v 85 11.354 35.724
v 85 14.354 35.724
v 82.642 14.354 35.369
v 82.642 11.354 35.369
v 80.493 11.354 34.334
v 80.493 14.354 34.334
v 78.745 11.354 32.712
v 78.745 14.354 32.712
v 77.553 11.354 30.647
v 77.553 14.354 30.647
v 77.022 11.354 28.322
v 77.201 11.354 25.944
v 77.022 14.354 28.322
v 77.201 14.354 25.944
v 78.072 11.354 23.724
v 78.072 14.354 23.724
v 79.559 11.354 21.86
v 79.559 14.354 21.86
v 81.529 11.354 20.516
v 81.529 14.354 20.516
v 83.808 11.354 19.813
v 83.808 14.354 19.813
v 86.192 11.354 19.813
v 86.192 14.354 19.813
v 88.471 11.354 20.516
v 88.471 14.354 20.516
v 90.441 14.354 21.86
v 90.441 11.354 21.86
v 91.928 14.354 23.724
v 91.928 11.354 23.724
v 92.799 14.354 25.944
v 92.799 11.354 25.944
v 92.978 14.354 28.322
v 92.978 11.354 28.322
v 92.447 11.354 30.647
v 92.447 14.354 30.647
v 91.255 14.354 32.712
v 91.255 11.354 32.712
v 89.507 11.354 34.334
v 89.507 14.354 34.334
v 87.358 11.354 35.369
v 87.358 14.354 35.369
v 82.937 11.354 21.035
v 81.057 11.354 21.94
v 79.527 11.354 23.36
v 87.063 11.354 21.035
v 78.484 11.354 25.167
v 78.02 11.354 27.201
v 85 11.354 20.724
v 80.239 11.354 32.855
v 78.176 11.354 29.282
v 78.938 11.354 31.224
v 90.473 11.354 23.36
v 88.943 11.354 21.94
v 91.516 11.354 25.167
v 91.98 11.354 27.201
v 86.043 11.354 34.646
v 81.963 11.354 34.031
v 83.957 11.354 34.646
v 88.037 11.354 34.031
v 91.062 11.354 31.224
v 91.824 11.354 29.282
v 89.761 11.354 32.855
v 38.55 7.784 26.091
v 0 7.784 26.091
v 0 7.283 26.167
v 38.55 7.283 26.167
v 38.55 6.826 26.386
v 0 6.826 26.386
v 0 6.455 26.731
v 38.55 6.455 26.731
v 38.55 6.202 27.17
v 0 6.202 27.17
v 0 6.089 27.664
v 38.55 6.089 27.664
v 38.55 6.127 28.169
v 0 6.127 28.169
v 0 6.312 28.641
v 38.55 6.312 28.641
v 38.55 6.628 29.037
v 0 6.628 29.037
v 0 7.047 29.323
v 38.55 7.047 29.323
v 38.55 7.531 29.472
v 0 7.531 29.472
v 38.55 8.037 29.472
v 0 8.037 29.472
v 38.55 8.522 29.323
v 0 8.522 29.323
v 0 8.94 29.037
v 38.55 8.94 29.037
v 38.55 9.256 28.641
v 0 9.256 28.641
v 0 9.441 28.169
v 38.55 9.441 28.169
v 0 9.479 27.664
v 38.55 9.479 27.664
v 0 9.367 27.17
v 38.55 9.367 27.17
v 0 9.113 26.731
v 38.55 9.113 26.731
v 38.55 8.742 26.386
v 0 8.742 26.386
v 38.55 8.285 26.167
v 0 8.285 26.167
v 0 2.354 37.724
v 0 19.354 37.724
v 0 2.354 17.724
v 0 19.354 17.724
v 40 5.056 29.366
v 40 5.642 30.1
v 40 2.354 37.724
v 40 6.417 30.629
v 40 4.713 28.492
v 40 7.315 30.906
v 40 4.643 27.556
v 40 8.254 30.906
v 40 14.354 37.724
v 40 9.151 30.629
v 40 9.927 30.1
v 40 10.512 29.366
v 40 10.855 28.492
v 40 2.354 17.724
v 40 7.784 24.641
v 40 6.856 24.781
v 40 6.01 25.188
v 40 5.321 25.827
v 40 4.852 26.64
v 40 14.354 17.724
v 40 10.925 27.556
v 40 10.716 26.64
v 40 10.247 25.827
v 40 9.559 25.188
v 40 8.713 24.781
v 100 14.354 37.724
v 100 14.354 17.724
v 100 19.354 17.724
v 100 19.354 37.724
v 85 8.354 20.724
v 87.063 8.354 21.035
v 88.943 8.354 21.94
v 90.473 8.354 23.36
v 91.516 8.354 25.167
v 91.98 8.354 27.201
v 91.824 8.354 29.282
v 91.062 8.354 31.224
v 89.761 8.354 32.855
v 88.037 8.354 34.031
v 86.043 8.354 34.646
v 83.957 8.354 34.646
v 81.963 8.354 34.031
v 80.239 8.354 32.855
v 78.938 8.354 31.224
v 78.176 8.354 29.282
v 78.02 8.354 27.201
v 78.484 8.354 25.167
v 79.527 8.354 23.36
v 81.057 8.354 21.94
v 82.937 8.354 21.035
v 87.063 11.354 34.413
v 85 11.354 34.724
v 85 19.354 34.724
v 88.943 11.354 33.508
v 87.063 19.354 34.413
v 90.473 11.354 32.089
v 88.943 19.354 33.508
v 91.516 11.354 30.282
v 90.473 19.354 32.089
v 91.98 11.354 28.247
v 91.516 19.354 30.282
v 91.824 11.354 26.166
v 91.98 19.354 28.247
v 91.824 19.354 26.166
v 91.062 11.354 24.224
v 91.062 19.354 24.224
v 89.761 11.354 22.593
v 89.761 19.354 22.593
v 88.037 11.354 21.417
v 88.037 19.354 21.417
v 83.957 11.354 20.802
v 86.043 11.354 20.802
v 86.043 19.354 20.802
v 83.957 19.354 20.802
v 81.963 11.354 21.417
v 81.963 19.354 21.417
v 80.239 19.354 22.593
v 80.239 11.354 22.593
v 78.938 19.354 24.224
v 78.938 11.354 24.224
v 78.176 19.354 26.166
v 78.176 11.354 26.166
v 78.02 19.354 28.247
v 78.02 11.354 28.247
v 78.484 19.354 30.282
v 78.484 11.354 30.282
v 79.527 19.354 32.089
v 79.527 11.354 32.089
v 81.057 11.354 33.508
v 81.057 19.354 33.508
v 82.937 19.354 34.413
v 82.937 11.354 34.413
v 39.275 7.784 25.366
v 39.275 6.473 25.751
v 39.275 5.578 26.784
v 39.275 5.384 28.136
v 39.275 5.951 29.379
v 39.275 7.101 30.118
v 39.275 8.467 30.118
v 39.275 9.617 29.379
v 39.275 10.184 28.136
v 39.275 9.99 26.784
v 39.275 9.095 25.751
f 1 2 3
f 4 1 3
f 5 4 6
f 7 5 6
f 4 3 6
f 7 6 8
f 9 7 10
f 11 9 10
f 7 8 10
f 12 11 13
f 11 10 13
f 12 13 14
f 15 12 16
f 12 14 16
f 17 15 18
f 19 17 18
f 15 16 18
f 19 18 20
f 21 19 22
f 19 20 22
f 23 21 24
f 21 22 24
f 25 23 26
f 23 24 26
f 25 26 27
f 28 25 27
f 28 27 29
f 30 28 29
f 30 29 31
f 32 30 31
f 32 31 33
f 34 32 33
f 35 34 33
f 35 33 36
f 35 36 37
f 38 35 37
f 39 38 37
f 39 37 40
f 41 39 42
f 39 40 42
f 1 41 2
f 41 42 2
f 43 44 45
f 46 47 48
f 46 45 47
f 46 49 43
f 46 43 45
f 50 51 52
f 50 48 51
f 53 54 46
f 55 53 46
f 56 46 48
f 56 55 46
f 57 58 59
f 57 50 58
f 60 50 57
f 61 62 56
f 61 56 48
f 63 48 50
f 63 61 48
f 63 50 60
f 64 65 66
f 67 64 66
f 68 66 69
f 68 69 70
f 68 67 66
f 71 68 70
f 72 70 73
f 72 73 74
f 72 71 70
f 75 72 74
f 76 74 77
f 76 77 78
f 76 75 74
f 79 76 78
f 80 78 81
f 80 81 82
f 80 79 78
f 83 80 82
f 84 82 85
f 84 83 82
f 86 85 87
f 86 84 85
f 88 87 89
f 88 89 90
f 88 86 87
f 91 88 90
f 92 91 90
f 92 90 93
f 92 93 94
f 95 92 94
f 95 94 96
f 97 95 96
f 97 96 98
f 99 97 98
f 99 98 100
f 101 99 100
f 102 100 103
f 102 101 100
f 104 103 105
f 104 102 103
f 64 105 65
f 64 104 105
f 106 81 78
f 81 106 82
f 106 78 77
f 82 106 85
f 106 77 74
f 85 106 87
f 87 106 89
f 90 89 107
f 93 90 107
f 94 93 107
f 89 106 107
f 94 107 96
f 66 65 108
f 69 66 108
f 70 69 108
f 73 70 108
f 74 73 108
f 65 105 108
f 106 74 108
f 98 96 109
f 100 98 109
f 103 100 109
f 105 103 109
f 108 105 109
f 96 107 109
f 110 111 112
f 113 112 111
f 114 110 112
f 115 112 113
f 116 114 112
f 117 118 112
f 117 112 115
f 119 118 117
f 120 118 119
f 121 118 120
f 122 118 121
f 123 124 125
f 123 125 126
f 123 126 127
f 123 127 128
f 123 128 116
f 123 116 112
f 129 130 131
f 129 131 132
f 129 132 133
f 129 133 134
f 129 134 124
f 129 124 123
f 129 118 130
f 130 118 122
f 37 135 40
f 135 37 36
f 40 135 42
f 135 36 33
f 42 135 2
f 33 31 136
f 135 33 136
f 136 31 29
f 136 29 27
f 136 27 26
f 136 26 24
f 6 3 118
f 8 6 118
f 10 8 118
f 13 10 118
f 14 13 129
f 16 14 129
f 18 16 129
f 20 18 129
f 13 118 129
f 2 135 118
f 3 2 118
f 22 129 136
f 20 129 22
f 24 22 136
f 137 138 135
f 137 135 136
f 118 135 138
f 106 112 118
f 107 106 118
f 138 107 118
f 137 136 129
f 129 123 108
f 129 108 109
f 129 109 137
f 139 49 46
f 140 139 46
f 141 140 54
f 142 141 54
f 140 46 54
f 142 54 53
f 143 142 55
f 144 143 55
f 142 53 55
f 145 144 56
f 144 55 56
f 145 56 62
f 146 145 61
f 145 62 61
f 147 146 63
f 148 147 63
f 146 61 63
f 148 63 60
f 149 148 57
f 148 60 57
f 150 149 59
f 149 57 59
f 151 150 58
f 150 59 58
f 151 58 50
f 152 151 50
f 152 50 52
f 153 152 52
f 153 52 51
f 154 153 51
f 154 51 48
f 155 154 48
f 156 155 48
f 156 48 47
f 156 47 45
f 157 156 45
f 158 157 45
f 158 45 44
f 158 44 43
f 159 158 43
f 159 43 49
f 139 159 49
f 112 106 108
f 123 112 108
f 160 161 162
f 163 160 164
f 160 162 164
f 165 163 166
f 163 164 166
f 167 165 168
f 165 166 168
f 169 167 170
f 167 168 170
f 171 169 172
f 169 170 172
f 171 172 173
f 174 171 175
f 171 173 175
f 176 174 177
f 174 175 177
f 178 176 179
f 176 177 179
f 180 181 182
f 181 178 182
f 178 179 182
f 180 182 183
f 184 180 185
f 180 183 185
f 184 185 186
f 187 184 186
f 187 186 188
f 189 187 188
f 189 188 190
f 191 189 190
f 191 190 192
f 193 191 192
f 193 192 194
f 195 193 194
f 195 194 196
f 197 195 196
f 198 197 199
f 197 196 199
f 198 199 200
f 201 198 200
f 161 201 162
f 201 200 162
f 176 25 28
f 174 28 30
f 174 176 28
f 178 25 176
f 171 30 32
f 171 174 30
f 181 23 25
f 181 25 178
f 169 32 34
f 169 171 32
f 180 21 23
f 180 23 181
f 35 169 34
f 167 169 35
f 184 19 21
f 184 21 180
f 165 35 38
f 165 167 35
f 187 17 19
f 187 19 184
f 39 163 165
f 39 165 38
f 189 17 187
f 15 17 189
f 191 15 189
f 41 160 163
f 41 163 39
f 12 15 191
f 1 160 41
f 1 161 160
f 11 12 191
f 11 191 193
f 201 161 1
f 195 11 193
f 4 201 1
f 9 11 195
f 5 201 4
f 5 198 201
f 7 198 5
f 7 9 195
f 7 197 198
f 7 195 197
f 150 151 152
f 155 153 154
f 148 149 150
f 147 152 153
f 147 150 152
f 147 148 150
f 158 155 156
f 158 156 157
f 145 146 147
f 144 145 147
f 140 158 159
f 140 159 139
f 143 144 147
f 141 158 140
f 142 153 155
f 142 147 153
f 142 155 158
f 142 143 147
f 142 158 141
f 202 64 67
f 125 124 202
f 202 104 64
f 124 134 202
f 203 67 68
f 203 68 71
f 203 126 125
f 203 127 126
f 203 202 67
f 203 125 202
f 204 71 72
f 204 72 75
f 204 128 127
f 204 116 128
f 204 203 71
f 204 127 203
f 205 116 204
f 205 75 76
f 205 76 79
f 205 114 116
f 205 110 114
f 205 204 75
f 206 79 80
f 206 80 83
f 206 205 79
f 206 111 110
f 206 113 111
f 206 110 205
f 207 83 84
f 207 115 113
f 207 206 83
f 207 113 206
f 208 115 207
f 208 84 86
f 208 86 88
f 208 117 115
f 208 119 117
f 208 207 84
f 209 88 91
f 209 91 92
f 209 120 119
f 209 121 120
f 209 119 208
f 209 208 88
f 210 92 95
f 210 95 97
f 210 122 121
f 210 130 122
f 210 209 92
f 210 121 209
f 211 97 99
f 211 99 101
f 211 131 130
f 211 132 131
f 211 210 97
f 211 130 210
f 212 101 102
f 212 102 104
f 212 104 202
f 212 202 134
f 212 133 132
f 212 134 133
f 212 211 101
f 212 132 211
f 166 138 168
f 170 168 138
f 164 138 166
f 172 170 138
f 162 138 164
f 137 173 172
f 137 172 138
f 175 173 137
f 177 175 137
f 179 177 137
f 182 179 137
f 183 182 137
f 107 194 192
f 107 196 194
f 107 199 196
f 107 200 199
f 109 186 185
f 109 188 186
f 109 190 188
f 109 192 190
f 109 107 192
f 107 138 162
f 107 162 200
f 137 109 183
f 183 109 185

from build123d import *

# Parameters (mm, degrees)
SKETCH_1_W          = 20
SKETCH_1_H          = 17
EXTRUDE_1_DEPTH     = 40
SKETCH_2_W          = 20
SKETCH_2_H          = 5
EXTRUDE_2_DEPTH     = 60
SKETCH_3_R          = 8
EXTRUDE_3_DEPTH     = 3
SKETCH_4_R          = 7
EXTRUDE_4_DEPTH     = 3
SKETCH_16_R         = 7
CUT_EXTRUDE_1_DEPTH = 8


with BuildPart() as part:
    # Эскиз1 → Бобышка-Вытянуть1 (new body)
    with BuildSketch(Plane(origin=(0, 0, 0), x_dir=(0, 0, -1), z_dir=(1, 0, 0))):
        with Locations((-27.72412662, 10.853987982)):
            Rectangle(SKETCH_1_W, SKETCH_1_H)
    extrude(amount=EXTRUDE_1_DEPTH)

    # Эскиз2 → Бобышка-Вытянуть2 (add)
    with BuildSketch(Plane(origin=(40, 0, 0), x_dir=(0, 0, -1), z_dir=(1, 0, 0))):
        with Locations((-27.72412662, 16.853987982)):
            Rectangle(SKETCH_2_W, SKETCH_2_H)
    extrude(amount=EXTRUDE_2_DEPTH)

    # Эскиз3 → Бобышка-Вытянуть3 (add)
    with BuildSketch(Plane.XZ.offset(-14.353987982)):
        with Locations(Location((85, 27.72412662, 0), (0, 0, 90))):
            Circle(SKETCH_3_R)
    extrude(amount=EXTRUDE_3_DEPTH)

    # Эскиз4 → Бобышка-Вытянуть4 (add)
    with BuildSketch(Plane.XZ.offset(-11.353987982)):
        with Locations(Location((85, 27.72412662, 0), (0, 0, 270))):
            Circle(SKETCH_4_R)
    extrude(amount=EXTRUDE_4_DEPTH)

    # Эскиз15 → Зенковка для винта с полупотайной головкой M32 (revolve, cut)
    with BuildSketch(Plane(origin=(40, 7.784111953, 27.791024889), x_dir=(0, 0, -1), z_dir=(0, 1, 0))):
        Polygon((0, 0), (0, 40), (1.7, 40), (1.7, 1.45), (3.15, 0), align=None)
    revolve(axis=Axis((46.35, 7.784111953, 27.791024889), (-1, 0, 0)), mode=Mode.SUBTRACT)

    # Эскиз16 → Вырез-Вытянуть1 (cut)
    with BuildSketch(Plane(origin=(0, 19.353987982, 0), x_dir=(1, 0, 0), z_dir=(0, 1, 0))):
        with Locations(Location((85, -27.72412662, 0), (0, 0, 270))):
            Circle(SKETCH_16_R)
    extrude(amount=-CUT_EXTRUDE_1_DEPTH, mode=Mode.SUBTRACT)


with BuildPart() as cut_extrude_1_piece_1:
    # of the separate pieces the step leaves, piece 1, a body of its own (cut_extrude_1_pieces)
    add(part.part.solids().sort_by_distance((0, 2.353987982, 37.72412662))[0])


with BuildPart() as cut_extrude_1_piece_2:
    # of the separate pieces the step leaves, piece 2, a body of its own (cut_extrude_1_pieces)
    add(part.part.solids().sort_by_distance((85, 8.353987982, 20.72412662))[0])


solid = Compound([cut_extrude_1_piece_1.part, cut_extrude_1_piece_2.part])
